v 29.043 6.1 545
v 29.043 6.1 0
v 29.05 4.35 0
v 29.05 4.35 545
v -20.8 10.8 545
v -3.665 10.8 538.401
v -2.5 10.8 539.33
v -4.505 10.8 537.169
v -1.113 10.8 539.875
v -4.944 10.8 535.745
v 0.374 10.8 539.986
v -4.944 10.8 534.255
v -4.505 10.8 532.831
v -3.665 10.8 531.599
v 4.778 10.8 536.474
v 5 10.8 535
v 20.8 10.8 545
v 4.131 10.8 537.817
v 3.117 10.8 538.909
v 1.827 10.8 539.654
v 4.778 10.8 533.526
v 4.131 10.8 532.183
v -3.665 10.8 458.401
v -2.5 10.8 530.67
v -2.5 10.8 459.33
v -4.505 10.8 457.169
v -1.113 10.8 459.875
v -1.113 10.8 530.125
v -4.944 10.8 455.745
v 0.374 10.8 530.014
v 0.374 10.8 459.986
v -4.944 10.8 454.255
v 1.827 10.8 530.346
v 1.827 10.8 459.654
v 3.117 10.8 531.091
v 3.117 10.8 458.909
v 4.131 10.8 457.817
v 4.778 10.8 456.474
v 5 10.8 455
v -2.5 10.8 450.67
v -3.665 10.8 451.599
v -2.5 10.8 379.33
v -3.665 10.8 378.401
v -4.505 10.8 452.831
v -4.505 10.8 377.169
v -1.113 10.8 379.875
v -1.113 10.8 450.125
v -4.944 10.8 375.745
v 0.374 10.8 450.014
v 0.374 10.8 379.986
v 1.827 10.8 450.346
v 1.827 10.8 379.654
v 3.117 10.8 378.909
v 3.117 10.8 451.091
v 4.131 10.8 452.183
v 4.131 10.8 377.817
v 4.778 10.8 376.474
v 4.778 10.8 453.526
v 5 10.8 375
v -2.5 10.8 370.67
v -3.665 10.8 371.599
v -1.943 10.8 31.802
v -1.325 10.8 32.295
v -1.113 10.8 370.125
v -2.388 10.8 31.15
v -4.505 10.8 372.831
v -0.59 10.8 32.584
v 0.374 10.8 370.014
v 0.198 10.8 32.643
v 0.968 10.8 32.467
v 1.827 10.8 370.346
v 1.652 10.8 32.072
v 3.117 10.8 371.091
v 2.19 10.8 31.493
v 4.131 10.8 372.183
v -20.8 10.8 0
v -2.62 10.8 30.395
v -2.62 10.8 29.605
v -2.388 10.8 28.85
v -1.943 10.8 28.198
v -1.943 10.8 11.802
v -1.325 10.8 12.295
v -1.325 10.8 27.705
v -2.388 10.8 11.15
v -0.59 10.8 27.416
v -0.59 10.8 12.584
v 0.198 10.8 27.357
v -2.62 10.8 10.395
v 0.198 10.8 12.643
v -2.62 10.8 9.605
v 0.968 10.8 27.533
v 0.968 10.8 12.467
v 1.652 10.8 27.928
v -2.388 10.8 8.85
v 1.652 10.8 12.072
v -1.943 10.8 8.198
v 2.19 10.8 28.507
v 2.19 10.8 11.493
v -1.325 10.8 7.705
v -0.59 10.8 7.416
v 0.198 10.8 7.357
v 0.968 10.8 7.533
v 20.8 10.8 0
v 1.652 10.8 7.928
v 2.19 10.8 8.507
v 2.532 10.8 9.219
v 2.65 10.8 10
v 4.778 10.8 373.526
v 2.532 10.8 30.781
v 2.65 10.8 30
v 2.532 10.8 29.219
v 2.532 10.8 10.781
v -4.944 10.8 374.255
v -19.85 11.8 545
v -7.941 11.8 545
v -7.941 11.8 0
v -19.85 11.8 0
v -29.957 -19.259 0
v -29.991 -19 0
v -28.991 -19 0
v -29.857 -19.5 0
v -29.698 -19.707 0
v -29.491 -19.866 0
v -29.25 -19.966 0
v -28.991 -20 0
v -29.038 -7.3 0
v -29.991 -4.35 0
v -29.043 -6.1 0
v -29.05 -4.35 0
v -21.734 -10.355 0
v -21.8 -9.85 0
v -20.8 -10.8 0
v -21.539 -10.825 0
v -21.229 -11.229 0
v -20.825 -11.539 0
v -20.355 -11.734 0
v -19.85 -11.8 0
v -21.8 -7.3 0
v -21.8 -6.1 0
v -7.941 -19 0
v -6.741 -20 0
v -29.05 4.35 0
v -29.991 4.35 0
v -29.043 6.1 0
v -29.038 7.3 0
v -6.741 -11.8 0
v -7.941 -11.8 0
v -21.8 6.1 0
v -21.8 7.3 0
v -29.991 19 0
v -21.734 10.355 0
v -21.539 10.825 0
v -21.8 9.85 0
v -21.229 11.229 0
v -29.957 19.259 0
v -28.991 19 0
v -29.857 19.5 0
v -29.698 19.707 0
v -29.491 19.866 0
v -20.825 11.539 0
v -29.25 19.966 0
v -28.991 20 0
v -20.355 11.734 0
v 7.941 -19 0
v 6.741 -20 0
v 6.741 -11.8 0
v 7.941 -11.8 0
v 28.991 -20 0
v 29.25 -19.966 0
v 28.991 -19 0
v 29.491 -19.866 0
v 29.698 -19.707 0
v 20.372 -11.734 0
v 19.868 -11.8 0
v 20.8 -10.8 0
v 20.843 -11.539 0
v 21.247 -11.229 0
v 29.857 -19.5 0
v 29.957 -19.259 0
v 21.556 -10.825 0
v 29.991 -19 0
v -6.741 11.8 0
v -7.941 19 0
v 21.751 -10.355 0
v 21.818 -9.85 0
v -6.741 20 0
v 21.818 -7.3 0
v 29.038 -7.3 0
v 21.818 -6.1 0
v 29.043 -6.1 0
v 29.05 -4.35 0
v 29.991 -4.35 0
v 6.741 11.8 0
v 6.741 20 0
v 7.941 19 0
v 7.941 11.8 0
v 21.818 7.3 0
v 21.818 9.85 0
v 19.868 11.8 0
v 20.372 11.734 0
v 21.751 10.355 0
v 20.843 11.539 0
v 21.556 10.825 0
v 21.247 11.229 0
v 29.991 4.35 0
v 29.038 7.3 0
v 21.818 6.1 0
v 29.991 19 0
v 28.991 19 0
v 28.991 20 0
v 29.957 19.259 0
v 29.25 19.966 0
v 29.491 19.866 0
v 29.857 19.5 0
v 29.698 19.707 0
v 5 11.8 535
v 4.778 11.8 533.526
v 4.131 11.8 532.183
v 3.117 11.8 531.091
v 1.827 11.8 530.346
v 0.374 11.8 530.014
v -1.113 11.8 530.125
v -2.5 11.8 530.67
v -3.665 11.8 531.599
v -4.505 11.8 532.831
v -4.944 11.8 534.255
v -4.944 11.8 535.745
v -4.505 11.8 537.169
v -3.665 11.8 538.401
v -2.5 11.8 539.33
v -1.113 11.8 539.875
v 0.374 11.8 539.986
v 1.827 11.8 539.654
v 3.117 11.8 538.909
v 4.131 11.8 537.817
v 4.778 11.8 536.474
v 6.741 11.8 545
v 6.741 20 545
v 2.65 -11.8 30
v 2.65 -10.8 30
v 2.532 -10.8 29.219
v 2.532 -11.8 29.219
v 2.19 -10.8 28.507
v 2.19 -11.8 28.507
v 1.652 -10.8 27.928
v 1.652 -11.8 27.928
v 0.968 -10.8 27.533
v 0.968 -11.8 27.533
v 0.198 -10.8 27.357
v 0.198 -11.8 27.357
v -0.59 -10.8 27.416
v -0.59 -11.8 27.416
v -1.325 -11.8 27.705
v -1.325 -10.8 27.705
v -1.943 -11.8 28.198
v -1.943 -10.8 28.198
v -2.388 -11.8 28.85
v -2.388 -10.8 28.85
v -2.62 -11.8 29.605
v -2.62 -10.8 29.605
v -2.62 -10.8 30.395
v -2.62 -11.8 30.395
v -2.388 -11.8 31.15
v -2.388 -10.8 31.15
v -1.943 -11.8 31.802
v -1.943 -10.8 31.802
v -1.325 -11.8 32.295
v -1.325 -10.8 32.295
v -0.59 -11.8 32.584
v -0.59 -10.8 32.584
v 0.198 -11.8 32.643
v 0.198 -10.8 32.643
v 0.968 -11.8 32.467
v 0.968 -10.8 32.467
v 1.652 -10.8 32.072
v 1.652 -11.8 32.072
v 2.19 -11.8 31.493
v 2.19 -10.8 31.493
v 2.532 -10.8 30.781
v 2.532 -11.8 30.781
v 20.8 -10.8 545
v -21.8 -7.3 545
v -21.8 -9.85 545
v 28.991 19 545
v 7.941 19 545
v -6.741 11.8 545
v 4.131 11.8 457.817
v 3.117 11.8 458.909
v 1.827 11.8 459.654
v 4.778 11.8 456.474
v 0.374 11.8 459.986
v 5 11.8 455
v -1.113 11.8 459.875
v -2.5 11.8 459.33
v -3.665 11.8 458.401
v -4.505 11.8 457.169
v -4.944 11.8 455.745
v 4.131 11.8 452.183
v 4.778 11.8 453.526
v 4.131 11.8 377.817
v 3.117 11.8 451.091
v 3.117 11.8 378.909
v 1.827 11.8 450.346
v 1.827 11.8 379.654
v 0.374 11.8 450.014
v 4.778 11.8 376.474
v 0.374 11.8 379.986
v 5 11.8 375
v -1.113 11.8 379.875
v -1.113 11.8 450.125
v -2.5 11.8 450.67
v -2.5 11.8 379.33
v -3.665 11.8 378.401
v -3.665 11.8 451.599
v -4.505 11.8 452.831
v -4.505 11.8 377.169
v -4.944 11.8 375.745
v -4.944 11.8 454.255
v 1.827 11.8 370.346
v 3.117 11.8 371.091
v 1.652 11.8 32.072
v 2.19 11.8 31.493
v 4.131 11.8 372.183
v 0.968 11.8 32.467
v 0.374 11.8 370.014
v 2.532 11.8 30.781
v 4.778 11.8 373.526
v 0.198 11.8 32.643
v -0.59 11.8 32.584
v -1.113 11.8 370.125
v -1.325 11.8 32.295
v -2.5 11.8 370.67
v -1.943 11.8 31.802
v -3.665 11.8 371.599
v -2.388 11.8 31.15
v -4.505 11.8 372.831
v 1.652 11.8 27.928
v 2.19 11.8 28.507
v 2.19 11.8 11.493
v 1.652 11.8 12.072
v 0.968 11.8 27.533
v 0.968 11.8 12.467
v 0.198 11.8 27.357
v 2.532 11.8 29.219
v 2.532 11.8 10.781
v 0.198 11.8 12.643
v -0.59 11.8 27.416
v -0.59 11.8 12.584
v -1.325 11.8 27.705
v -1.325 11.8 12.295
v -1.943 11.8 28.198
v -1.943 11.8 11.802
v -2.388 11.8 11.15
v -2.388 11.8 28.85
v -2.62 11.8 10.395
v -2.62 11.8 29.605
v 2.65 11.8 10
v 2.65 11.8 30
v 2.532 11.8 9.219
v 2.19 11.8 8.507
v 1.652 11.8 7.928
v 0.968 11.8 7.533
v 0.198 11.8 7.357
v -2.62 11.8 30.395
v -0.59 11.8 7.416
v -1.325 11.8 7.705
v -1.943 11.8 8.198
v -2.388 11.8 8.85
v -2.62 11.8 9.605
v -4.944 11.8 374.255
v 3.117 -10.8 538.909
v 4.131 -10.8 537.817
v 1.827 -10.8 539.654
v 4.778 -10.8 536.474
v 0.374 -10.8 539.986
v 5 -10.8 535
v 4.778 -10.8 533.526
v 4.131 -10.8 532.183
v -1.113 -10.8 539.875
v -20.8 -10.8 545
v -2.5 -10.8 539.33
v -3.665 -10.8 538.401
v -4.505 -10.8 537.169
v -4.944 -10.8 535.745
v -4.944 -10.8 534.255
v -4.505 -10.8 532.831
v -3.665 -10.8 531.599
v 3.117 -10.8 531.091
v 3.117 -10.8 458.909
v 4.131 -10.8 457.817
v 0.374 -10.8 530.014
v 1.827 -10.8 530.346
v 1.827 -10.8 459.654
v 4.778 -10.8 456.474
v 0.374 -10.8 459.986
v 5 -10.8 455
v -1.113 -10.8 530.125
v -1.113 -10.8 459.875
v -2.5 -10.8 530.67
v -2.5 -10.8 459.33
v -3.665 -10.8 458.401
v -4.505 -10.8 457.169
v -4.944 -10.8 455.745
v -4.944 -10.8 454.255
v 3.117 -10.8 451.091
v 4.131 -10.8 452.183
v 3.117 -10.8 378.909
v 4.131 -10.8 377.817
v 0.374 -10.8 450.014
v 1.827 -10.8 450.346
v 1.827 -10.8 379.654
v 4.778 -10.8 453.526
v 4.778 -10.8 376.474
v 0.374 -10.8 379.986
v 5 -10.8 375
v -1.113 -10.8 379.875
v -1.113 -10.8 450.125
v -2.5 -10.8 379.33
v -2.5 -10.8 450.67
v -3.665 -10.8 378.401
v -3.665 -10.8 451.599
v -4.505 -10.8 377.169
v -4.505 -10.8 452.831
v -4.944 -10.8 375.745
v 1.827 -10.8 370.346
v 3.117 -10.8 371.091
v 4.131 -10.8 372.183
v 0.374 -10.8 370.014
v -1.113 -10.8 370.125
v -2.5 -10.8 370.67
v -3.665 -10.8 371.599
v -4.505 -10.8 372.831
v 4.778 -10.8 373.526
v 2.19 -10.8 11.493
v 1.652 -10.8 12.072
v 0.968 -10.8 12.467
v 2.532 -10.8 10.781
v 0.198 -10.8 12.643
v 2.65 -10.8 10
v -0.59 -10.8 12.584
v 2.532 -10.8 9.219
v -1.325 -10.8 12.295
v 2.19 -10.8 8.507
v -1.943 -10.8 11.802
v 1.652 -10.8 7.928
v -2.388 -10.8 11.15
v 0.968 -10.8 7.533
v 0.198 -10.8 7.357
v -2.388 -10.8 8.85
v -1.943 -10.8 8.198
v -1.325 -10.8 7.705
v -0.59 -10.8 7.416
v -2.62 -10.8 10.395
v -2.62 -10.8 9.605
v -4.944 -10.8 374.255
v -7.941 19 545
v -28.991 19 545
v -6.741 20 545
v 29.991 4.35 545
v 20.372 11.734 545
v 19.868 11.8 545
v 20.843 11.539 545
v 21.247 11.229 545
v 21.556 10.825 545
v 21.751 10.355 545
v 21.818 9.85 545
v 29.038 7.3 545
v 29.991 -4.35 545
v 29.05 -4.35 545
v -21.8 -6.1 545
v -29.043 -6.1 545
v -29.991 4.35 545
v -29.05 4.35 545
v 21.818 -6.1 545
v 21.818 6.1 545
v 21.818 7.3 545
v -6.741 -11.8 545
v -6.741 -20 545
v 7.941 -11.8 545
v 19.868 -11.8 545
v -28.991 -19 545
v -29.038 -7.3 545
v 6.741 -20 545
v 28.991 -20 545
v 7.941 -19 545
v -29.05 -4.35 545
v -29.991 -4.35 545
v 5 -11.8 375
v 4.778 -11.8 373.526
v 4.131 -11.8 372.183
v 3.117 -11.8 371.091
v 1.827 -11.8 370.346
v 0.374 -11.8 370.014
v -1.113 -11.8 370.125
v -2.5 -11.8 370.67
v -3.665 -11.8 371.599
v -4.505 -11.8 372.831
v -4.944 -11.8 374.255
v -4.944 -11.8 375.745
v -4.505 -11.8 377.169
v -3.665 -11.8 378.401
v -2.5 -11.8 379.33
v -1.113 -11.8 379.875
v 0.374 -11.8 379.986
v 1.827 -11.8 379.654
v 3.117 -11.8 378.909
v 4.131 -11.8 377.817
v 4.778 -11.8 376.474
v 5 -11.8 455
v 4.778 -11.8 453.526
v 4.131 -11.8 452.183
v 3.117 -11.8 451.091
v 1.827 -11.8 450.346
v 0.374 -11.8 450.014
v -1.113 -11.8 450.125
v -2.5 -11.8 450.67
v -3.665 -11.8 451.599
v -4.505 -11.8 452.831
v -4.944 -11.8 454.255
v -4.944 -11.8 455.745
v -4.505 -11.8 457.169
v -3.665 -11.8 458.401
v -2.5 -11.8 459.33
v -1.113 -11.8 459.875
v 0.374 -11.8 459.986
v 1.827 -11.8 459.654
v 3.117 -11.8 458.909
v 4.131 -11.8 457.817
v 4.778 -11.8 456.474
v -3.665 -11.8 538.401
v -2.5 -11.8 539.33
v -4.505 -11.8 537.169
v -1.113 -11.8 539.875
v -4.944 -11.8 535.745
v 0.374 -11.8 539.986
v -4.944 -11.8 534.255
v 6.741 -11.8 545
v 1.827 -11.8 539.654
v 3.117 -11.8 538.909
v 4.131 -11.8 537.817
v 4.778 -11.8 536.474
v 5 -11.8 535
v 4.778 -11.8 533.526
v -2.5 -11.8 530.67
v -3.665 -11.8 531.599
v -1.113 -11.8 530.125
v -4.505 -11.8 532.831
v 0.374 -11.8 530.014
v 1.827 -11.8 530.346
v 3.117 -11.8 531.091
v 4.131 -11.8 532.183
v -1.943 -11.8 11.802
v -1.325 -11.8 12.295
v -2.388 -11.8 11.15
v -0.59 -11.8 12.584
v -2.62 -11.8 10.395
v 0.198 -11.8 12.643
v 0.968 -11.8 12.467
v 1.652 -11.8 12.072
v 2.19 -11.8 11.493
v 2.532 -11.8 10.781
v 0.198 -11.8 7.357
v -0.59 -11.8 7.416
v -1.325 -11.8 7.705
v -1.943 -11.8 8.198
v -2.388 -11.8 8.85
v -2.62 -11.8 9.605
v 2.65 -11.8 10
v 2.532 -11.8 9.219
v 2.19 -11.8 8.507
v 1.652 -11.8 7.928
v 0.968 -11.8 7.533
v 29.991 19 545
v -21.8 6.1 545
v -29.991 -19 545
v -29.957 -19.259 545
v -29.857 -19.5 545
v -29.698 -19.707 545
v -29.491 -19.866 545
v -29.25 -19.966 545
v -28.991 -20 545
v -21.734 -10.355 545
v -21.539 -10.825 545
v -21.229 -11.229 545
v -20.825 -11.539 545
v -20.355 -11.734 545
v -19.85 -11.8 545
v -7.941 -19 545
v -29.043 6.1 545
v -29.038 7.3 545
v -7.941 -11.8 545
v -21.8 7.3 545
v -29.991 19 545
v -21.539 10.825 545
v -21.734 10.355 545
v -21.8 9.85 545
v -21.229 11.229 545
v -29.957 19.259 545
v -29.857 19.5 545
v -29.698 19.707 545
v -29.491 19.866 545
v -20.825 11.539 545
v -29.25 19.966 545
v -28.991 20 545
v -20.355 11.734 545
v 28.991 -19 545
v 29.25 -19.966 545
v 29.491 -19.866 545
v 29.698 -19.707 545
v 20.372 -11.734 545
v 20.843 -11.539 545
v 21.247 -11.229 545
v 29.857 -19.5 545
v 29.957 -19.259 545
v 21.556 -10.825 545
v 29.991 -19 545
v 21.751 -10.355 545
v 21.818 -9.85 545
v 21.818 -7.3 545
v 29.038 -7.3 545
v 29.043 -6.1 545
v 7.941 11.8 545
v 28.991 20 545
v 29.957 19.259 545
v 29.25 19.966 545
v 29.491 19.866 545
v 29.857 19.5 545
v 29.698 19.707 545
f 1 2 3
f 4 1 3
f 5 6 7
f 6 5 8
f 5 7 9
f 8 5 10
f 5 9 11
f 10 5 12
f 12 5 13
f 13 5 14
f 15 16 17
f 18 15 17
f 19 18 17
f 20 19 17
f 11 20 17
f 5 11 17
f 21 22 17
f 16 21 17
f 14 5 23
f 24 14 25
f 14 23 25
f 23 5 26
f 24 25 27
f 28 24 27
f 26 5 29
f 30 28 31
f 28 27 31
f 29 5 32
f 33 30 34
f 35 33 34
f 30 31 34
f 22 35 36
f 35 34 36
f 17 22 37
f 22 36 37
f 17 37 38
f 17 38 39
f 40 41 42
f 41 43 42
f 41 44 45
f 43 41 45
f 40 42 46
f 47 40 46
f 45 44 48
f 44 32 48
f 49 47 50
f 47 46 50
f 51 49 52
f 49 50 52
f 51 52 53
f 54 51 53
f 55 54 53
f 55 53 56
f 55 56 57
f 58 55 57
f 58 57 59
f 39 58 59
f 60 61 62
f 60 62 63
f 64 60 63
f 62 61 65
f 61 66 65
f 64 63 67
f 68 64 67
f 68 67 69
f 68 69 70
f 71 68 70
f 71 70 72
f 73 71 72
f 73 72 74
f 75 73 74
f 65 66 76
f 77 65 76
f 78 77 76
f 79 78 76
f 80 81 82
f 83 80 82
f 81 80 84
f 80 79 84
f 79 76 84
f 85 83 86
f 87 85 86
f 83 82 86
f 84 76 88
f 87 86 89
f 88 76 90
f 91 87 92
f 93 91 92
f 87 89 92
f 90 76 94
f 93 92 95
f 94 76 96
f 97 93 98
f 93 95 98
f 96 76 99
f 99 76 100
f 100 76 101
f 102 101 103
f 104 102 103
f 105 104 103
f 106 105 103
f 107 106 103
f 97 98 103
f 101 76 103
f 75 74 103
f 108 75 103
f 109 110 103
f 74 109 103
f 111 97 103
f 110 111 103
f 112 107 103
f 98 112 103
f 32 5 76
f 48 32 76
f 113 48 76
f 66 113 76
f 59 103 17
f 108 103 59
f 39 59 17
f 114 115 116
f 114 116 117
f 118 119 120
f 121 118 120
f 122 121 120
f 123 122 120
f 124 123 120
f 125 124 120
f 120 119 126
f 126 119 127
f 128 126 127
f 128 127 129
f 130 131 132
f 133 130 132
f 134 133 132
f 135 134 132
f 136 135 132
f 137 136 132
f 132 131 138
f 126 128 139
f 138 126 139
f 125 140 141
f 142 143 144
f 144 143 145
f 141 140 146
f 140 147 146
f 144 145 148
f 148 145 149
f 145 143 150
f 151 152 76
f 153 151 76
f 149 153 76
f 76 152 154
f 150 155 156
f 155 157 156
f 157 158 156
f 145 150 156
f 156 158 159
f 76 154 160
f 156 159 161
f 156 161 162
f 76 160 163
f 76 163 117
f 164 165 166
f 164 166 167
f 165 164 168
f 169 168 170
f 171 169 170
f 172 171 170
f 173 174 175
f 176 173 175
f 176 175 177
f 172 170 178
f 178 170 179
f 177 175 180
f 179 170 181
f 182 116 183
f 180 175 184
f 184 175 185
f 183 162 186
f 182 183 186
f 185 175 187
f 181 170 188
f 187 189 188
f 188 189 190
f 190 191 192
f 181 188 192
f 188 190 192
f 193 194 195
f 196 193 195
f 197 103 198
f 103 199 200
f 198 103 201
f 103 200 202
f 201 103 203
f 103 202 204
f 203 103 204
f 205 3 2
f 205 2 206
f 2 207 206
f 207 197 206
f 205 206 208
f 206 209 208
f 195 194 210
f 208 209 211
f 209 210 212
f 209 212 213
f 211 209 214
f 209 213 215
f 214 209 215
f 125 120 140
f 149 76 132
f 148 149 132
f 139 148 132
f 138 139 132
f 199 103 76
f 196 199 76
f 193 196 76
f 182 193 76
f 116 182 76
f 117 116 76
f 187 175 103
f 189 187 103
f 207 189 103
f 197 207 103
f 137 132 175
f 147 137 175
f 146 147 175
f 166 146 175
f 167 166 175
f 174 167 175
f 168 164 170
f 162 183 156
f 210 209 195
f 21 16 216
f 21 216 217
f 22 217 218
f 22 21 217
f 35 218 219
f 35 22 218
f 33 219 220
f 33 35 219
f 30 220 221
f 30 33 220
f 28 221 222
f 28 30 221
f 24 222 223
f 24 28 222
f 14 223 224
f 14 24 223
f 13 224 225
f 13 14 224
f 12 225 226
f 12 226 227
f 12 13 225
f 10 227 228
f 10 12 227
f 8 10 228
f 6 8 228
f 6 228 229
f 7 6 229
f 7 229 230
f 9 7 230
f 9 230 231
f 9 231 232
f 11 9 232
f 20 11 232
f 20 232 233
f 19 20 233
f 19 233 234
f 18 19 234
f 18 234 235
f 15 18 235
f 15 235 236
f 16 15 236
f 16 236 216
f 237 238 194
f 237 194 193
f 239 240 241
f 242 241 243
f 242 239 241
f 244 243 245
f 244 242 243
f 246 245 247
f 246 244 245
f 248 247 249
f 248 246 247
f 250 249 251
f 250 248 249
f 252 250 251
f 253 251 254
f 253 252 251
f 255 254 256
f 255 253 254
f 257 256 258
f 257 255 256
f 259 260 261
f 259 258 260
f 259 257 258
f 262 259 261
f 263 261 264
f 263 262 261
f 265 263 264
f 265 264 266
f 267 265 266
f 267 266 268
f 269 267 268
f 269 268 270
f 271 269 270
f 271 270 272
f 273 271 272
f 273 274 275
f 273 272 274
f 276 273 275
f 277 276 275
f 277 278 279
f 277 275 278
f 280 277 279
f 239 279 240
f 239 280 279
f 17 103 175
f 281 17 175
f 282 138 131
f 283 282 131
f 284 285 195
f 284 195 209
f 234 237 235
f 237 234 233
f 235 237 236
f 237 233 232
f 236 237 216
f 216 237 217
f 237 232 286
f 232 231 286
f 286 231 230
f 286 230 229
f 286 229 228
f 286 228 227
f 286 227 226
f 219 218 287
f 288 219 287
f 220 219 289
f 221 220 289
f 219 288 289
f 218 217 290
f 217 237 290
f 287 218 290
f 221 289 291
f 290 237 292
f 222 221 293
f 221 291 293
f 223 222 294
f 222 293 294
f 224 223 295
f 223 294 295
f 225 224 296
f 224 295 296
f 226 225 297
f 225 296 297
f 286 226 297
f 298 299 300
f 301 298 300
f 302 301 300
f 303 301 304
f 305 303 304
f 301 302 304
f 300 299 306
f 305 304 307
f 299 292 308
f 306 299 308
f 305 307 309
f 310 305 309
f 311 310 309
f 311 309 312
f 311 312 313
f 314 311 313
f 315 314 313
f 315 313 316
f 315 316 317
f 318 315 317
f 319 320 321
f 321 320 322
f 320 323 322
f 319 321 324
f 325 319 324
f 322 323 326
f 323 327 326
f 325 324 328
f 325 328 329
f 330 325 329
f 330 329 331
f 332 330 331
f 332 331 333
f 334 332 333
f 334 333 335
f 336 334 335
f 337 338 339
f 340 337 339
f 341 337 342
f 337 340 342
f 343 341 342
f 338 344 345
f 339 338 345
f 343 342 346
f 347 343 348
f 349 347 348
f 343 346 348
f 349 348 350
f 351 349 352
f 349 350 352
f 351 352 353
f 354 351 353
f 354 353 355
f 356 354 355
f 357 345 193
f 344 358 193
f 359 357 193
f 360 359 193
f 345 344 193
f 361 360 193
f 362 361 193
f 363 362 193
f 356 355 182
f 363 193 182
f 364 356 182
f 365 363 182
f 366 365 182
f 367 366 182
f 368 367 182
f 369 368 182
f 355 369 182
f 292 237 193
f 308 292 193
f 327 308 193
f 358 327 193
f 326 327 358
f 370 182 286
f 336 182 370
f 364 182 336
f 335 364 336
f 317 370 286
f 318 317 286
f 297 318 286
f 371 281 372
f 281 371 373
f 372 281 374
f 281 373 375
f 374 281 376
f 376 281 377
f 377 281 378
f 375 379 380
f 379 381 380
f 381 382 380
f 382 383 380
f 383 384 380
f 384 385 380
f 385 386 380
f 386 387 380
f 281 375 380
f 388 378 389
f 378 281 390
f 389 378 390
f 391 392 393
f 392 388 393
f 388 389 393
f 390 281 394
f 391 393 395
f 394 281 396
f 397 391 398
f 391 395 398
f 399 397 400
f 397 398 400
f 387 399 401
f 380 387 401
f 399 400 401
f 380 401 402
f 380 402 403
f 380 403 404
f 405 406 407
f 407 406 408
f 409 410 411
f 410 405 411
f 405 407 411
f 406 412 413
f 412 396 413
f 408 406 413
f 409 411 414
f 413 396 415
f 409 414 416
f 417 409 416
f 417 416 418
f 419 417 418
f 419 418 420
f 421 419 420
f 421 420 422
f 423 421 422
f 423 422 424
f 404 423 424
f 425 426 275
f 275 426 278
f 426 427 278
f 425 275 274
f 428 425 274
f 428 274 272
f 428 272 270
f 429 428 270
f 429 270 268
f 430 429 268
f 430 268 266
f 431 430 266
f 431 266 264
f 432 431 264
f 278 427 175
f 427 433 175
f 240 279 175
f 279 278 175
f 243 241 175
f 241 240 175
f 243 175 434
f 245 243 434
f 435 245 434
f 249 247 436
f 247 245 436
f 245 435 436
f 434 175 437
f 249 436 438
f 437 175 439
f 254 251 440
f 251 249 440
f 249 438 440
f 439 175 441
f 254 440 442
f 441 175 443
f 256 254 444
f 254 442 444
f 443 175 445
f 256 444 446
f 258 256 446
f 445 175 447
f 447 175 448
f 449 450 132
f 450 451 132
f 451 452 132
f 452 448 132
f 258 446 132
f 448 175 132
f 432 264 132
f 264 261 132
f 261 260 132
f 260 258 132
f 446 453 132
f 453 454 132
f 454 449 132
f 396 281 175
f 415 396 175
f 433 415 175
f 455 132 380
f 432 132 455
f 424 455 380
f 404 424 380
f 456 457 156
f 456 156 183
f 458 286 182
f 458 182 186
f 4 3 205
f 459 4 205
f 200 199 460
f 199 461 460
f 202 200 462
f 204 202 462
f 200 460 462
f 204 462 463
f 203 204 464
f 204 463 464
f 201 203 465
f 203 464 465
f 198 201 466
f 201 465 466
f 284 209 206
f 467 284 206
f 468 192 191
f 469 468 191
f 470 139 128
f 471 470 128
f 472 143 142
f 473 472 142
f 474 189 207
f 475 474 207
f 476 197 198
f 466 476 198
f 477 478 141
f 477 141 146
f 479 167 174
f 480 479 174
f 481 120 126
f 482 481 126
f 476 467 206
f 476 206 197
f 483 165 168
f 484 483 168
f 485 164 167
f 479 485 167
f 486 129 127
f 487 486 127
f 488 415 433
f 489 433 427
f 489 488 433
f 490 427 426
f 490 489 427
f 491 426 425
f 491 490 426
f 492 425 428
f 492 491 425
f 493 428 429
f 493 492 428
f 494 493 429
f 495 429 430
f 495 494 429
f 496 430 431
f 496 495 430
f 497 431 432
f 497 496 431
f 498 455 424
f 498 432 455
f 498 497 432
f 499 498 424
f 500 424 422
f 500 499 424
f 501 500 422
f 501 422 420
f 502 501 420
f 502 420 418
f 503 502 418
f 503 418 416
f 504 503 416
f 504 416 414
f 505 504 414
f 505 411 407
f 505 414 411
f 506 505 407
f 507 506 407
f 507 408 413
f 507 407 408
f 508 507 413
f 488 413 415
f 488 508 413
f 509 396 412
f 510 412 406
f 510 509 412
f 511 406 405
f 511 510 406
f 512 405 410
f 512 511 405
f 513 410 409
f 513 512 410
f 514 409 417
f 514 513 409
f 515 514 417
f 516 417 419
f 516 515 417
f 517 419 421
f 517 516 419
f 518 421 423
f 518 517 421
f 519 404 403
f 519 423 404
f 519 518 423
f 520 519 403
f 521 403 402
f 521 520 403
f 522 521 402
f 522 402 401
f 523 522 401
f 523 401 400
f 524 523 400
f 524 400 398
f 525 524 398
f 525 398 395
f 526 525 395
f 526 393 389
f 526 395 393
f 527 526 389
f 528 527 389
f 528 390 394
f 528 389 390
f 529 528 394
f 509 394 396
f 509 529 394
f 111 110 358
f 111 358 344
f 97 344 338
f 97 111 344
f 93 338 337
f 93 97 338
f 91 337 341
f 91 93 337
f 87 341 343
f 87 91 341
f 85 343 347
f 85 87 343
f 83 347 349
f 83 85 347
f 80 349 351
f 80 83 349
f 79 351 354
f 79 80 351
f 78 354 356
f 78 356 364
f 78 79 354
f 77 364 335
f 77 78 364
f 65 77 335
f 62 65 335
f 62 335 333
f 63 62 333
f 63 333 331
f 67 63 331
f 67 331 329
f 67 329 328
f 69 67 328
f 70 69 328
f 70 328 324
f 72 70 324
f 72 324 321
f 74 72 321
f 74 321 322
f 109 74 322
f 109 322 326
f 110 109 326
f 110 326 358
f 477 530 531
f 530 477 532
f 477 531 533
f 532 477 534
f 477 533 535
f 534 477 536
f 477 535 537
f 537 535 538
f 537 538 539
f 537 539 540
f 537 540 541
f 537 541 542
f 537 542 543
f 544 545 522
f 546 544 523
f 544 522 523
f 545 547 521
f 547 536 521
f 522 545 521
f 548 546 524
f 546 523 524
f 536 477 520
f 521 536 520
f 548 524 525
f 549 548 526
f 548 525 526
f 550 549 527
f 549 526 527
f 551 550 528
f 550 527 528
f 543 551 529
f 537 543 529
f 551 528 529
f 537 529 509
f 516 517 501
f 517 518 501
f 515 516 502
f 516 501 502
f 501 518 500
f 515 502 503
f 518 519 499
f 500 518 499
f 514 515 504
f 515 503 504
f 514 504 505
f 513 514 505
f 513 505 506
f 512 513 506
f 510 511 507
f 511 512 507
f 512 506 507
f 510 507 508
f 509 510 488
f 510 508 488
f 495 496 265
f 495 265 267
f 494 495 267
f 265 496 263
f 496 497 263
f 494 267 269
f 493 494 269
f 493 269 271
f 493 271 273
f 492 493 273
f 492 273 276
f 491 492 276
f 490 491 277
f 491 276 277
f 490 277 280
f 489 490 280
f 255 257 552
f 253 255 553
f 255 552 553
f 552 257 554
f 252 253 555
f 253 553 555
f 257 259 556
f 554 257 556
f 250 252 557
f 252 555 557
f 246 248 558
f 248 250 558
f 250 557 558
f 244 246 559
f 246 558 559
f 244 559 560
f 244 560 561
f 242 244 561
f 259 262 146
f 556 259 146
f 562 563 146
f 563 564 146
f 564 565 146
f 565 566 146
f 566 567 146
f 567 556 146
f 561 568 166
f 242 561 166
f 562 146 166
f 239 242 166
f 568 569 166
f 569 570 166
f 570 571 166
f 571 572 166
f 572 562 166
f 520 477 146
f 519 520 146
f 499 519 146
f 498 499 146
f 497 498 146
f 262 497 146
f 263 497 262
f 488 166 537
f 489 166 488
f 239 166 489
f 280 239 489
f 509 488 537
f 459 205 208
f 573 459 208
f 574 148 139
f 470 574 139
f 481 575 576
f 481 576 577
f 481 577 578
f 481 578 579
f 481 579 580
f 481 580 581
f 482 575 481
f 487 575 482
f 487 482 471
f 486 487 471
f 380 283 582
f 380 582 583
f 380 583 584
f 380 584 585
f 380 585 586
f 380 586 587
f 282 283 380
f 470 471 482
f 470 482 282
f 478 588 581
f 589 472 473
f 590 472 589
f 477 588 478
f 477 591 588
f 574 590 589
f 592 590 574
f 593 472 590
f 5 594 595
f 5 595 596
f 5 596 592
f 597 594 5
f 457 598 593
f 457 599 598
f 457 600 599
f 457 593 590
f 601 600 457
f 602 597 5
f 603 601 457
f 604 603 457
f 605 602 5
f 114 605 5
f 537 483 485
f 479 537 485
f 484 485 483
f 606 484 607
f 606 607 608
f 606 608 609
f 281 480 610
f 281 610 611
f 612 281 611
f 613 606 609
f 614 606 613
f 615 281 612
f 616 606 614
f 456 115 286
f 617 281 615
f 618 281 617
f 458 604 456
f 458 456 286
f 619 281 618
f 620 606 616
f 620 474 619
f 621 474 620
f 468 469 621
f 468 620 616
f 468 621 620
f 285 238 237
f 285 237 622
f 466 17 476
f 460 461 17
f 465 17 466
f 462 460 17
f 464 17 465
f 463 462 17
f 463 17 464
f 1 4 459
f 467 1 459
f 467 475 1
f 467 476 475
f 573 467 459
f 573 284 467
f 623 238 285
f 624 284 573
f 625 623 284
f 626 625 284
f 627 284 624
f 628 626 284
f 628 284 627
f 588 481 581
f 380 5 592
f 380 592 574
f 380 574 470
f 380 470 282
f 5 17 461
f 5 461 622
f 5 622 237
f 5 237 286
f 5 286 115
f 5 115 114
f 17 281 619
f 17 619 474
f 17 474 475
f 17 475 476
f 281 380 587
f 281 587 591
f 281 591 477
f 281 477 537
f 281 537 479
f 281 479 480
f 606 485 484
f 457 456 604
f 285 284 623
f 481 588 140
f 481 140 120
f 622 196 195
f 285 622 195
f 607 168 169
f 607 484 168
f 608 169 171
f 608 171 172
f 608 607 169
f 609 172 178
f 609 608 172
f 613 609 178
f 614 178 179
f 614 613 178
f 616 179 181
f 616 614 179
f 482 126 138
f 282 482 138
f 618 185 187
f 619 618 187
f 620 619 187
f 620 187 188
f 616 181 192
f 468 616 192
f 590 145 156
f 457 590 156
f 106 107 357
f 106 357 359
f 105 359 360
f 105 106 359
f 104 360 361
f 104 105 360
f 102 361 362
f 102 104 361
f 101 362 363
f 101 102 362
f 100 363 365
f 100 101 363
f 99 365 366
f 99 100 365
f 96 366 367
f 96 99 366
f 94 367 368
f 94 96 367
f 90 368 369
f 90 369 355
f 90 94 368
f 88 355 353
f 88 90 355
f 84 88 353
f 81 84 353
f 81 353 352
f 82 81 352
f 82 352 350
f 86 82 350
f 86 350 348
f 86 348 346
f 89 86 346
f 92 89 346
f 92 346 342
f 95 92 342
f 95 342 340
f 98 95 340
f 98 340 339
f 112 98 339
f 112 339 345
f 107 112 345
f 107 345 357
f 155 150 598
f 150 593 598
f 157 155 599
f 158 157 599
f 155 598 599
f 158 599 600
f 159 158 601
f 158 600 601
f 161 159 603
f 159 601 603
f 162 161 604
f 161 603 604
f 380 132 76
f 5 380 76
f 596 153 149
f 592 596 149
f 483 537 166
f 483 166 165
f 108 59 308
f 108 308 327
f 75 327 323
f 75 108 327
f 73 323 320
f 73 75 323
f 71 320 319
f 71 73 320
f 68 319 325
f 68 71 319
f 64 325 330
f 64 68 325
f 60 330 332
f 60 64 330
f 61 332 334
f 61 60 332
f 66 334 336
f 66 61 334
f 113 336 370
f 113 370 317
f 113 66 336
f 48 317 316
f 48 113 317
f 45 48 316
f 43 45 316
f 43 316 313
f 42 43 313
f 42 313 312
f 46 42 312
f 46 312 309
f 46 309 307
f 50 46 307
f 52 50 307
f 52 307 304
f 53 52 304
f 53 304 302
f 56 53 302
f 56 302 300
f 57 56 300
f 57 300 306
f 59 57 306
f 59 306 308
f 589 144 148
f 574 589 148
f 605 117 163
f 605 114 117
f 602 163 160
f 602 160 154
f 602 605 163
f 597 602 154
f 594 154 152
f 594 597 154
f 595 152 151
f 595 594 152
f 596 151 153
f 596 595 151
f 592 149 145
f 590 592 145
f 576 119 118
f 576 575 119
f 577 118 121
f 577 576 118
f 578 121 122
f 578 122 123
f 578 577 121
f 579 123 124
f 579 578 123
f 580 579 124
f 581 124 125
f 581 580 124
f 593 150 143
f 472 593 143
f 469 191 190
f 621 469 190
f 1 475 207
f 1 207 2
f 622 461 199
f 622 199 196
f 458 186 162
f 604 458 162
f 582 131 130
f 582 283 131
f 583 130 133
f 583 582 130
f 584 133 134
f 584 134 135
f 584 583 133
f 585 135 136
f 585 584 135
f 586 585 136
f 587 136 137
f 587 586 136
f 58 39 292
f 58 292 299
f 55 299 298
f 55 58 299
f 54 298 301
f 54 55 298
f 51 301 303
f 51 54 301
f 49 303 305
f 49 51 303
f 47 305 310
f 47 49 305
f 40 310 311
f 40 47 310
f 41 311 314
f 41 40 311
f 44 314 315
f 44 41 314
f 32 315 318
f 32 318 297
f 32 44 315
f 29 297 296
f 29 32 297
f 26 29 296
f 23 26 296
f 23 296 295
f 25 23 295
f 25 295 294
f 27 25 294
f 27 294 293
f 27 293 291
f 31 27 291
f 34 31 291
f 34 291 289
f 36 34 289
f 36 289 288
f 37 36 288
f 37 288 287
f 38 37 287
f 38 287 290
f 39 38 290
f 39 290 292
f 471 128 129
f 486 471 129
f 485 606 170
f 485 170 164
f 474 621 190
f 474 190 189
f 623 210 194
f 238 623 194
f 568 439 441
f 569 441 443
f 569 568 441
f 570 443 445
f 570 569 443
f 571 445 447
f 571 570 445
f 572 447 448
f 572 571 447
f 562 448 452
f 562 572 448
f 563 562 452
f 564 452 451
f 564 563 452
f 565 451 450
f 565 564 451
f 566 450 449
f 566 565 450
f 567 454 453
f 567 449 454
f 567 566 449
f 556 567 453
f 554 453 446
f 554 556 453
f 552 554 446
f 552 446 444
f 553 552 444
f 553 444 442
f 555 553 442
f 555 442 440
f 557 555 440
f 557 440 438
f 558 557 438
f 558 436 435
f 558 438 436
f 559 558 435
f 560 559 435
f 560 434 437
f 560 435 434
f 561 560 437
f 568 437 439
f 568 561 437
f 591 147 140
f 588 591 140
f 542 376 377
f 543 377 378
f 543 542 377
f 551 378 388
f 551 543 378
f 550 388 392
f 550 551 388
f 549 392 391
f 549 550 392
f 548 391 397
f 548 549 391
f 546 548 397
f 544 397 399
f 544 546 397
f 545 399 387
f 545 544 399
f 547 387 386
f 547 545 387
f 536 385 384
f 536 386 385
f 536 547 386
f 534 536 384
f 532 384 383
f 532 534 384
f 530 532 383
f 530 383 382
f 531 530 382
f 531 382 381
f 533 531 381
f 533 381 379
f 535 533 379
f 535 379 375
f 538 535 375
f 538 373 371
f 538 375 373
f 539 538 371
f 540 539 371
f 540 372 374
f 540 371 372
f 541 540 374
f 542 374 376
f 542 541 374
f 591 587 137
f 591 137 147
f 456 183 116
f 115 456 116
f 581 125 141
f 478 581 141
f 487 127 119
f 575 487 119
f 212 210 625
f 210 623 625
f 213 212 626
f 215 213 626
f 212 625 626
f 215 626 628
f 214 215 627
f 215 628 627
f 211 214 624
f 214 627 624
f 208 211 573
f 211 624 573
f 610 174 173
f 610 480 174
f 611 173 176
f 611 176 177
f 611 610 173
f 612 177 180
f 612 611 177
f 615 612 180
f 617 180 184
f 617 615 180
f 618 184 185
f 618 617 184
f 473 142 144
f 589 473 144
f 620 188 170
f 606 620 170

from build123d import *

# Parameters (mm, degrees)
EXTRUDE_1_DEPTH     = 545
FILLET_1_R          = 1
FILLET_2_R          = 1.95
SKETCH_3_R          = 5
CUT_EXTRUDE_1_DEPTH = 548.288285847


with BuildPart() as part:
    # 草图2 → 凸台-拉伸1 (new body)
    with BuildSketch(Plane.XY):
        Polygon((-29.99112912, -4.35), (-29.99112912, -19), (-29.99112912, -20), (-29, -20), (-6.74112912, -20), (-6.74112912, -19), (-6.74112912, -11.8), (6.74112912, -11.8), (6.74112912, -19), (6.74112912, -20), (29, -20), (29.99112912, -20), (29.99112912, -19), (29.99112912, -4.35), (29.05, -4.35), (29.042967642, -6.1), (21.81774176, -6.1), (21.81774176, 6.1), (29.042967642, 6.1), (29.05, 4.35), (29.99112912, 4.35), (29.99112912, 19), (29.99112912, 20), (29, 20), (6.74112912, 20), (6.74112912, 19), (6.74112912, 11.8), (0.00887088, 11.8), (-6.74112912, 11.8), (-6.74112912, 19), (-6.74112912, 20), (-29, 20), (-29.99112912, 20), (-29.99112912, 19), (-29.99112912, 4.35), (-29.05, 4.35), (-29.042967642, 6.1), (-21.8, 6.1), (-21.8, -6.1), (-29.042967642, -6.1), (-29.05, -4.35), align=None)
        Polygon((-21.8, -7.3), (-21.8, -11.8), (-7.94112912, -11.8), (-7.94112912, -19), (-28.99112912, -19), (-29.038145454, -7.3), align=None, mode=Mode.SUBTRACT)
        Polygon((7.94112912, -11.8), (21.81774176, -11.8), (21.81774176, -7.3), (29.038145454, -7.3), (28.99112912, -19), (7.94112912, -19), align=None, mode=Mode.SUBTRACT)
        Polygon((-7.94112912, 11.8), (-21.8, 11.8), (-21.8, 7.3), (-29.038145454, 7.3), (-28.99112912, 19), (-7.94112912, 19), align=None, mode=Mode.SUBTRACT)
        Polygon((-20.8, 10.8), (0, 10.8), (20.8, 10.8), (20.8, -10.8), (-20.8, -10.8), align=None, mode=Mode.SUBTRACT)
        Polygon((21.81774176, 7.3), (21.81774176, 11.8), (7.94112912, 11.8), (7.94112912, 19), (28.99112912, 19), (29.038145454, 7.3), align=None, mode=Mode.SUBTRACT)
    extrude(amount=EXTRUDE_1_DEPTH)

    # 圆角1
    fillet_1_edges = [part.edges().sort_by_distance(p)[0] for p in [
        (29.99112912, -20, 272.5),
        (-29.99112912, 20, 272.5),
        (-29.99112912, -20, 272.5),
        (29.99112912, 20, 272.5),
    ]]
    fillet(fillet_1_edges, radius=FILLET_1_R)

    # 圆角2
    fillet_2_edges = [part.edges().sort_by_distance(p)[0] for p in [
        (-21.8, -11.8, 272.5),
        (21.81774176, -11.8, 272.5),
        (21.81774176, 11.8, 272.5),
        (-21.8, 11.8, 272.5),
    ]]
    fillet(fillet_2_edges, radius=FILLET_2_R)

    # 草图3 → 切除-拉伸1 (cut, through all)
    with BuildSketch(Plane(origin=(0, 20, 0), x_dir=(1, 0, 0), z_dir=(0, 1, 0))):
        with BuildLine():
            ThreePointArc((2.65, -10), (1.87383297, -8.12616703), (0, -7.35))
            Line((0, -7.35), (0, -10))
            Line((0, -10), (0, -12.65))
            ThreePointArc((0, -12.65), (1.87383297, -11.87383297), (2.65, -10))
        make_face()
        with BuildLine():
            Line((0, -10), (0, -7.35))
            ThreePointArc((0, -7.35), (-2.65, -10), (0, -12.65))
            Line((0, -12.65), (0, -10))
        make_face()
        with BuildLine():
            ThreePointArc((2.65, -30), (1.87383297, -28.12616703), (0, -27.35))
            Line((0, -27.35), (0, -30))
            Line((0, -30), (0, -32.65))
            ThreePointArc((0, -32.65), (1.87383297, -31.87383297), (2.65, -30))
        make_face()
        with BuildLine():
            Line((0, -30), (0, -27.35))
            ThreePointArc((0, -27.35), (-2.65, -30), (0, -32.65))
            Line((0, -32.65), (0, -30))
        make_face()
        with BuildLine():
            ThreePointArc((2.65, -30), (1.87383297, -28.12616703), (0, -27.35))
            Line((0, -27.35), (0, -30))
            Line((0, -30), (0, -32.65))
            ThreePointArc((0, -32.65), (1.87383297, -31.87383297), (2.65, -30))
        make_face()
        with BuildLine():
            Line((0, -30), (0, -27.35))
            ThreePointArc((0, -27.35), (-2.65, -30), (0, -32.65))
            Line((0, -32.65), (0, -30))
        make_face()
        with BuildLine():
            ThreePointArc((2.65, -10), (1.87383297, -8.12616703), (0, -7.35))
            Line((0, -7.35), (0, -10))
            Line((0, -10), (0, -12.65))
            ThreePointArc((0, -12.65), (1.87383297, -11.87383297), (2.65, -10))
        make_face()
        with BuildLine():
            Line((0, -10), (0, -7.35))
            ThreePointArc((0, -7.35), (-2.65, -10), (0, -12.65))
            Line((0, -12.65), (0, -10))
        make_face()
        with Locations((0, -535)):
            Circle(SKETCH_3_R)
        with Locations((0, -455)):
            Circle(SKETCH_3_R)
        with Locations((0, -375)):
            Circle(SKETCH_3_R)
    extrude(amount=-CUT_EXTRUDE_1_DEPTH, mode=Mode.SUBTRACT)


solid = part.part
